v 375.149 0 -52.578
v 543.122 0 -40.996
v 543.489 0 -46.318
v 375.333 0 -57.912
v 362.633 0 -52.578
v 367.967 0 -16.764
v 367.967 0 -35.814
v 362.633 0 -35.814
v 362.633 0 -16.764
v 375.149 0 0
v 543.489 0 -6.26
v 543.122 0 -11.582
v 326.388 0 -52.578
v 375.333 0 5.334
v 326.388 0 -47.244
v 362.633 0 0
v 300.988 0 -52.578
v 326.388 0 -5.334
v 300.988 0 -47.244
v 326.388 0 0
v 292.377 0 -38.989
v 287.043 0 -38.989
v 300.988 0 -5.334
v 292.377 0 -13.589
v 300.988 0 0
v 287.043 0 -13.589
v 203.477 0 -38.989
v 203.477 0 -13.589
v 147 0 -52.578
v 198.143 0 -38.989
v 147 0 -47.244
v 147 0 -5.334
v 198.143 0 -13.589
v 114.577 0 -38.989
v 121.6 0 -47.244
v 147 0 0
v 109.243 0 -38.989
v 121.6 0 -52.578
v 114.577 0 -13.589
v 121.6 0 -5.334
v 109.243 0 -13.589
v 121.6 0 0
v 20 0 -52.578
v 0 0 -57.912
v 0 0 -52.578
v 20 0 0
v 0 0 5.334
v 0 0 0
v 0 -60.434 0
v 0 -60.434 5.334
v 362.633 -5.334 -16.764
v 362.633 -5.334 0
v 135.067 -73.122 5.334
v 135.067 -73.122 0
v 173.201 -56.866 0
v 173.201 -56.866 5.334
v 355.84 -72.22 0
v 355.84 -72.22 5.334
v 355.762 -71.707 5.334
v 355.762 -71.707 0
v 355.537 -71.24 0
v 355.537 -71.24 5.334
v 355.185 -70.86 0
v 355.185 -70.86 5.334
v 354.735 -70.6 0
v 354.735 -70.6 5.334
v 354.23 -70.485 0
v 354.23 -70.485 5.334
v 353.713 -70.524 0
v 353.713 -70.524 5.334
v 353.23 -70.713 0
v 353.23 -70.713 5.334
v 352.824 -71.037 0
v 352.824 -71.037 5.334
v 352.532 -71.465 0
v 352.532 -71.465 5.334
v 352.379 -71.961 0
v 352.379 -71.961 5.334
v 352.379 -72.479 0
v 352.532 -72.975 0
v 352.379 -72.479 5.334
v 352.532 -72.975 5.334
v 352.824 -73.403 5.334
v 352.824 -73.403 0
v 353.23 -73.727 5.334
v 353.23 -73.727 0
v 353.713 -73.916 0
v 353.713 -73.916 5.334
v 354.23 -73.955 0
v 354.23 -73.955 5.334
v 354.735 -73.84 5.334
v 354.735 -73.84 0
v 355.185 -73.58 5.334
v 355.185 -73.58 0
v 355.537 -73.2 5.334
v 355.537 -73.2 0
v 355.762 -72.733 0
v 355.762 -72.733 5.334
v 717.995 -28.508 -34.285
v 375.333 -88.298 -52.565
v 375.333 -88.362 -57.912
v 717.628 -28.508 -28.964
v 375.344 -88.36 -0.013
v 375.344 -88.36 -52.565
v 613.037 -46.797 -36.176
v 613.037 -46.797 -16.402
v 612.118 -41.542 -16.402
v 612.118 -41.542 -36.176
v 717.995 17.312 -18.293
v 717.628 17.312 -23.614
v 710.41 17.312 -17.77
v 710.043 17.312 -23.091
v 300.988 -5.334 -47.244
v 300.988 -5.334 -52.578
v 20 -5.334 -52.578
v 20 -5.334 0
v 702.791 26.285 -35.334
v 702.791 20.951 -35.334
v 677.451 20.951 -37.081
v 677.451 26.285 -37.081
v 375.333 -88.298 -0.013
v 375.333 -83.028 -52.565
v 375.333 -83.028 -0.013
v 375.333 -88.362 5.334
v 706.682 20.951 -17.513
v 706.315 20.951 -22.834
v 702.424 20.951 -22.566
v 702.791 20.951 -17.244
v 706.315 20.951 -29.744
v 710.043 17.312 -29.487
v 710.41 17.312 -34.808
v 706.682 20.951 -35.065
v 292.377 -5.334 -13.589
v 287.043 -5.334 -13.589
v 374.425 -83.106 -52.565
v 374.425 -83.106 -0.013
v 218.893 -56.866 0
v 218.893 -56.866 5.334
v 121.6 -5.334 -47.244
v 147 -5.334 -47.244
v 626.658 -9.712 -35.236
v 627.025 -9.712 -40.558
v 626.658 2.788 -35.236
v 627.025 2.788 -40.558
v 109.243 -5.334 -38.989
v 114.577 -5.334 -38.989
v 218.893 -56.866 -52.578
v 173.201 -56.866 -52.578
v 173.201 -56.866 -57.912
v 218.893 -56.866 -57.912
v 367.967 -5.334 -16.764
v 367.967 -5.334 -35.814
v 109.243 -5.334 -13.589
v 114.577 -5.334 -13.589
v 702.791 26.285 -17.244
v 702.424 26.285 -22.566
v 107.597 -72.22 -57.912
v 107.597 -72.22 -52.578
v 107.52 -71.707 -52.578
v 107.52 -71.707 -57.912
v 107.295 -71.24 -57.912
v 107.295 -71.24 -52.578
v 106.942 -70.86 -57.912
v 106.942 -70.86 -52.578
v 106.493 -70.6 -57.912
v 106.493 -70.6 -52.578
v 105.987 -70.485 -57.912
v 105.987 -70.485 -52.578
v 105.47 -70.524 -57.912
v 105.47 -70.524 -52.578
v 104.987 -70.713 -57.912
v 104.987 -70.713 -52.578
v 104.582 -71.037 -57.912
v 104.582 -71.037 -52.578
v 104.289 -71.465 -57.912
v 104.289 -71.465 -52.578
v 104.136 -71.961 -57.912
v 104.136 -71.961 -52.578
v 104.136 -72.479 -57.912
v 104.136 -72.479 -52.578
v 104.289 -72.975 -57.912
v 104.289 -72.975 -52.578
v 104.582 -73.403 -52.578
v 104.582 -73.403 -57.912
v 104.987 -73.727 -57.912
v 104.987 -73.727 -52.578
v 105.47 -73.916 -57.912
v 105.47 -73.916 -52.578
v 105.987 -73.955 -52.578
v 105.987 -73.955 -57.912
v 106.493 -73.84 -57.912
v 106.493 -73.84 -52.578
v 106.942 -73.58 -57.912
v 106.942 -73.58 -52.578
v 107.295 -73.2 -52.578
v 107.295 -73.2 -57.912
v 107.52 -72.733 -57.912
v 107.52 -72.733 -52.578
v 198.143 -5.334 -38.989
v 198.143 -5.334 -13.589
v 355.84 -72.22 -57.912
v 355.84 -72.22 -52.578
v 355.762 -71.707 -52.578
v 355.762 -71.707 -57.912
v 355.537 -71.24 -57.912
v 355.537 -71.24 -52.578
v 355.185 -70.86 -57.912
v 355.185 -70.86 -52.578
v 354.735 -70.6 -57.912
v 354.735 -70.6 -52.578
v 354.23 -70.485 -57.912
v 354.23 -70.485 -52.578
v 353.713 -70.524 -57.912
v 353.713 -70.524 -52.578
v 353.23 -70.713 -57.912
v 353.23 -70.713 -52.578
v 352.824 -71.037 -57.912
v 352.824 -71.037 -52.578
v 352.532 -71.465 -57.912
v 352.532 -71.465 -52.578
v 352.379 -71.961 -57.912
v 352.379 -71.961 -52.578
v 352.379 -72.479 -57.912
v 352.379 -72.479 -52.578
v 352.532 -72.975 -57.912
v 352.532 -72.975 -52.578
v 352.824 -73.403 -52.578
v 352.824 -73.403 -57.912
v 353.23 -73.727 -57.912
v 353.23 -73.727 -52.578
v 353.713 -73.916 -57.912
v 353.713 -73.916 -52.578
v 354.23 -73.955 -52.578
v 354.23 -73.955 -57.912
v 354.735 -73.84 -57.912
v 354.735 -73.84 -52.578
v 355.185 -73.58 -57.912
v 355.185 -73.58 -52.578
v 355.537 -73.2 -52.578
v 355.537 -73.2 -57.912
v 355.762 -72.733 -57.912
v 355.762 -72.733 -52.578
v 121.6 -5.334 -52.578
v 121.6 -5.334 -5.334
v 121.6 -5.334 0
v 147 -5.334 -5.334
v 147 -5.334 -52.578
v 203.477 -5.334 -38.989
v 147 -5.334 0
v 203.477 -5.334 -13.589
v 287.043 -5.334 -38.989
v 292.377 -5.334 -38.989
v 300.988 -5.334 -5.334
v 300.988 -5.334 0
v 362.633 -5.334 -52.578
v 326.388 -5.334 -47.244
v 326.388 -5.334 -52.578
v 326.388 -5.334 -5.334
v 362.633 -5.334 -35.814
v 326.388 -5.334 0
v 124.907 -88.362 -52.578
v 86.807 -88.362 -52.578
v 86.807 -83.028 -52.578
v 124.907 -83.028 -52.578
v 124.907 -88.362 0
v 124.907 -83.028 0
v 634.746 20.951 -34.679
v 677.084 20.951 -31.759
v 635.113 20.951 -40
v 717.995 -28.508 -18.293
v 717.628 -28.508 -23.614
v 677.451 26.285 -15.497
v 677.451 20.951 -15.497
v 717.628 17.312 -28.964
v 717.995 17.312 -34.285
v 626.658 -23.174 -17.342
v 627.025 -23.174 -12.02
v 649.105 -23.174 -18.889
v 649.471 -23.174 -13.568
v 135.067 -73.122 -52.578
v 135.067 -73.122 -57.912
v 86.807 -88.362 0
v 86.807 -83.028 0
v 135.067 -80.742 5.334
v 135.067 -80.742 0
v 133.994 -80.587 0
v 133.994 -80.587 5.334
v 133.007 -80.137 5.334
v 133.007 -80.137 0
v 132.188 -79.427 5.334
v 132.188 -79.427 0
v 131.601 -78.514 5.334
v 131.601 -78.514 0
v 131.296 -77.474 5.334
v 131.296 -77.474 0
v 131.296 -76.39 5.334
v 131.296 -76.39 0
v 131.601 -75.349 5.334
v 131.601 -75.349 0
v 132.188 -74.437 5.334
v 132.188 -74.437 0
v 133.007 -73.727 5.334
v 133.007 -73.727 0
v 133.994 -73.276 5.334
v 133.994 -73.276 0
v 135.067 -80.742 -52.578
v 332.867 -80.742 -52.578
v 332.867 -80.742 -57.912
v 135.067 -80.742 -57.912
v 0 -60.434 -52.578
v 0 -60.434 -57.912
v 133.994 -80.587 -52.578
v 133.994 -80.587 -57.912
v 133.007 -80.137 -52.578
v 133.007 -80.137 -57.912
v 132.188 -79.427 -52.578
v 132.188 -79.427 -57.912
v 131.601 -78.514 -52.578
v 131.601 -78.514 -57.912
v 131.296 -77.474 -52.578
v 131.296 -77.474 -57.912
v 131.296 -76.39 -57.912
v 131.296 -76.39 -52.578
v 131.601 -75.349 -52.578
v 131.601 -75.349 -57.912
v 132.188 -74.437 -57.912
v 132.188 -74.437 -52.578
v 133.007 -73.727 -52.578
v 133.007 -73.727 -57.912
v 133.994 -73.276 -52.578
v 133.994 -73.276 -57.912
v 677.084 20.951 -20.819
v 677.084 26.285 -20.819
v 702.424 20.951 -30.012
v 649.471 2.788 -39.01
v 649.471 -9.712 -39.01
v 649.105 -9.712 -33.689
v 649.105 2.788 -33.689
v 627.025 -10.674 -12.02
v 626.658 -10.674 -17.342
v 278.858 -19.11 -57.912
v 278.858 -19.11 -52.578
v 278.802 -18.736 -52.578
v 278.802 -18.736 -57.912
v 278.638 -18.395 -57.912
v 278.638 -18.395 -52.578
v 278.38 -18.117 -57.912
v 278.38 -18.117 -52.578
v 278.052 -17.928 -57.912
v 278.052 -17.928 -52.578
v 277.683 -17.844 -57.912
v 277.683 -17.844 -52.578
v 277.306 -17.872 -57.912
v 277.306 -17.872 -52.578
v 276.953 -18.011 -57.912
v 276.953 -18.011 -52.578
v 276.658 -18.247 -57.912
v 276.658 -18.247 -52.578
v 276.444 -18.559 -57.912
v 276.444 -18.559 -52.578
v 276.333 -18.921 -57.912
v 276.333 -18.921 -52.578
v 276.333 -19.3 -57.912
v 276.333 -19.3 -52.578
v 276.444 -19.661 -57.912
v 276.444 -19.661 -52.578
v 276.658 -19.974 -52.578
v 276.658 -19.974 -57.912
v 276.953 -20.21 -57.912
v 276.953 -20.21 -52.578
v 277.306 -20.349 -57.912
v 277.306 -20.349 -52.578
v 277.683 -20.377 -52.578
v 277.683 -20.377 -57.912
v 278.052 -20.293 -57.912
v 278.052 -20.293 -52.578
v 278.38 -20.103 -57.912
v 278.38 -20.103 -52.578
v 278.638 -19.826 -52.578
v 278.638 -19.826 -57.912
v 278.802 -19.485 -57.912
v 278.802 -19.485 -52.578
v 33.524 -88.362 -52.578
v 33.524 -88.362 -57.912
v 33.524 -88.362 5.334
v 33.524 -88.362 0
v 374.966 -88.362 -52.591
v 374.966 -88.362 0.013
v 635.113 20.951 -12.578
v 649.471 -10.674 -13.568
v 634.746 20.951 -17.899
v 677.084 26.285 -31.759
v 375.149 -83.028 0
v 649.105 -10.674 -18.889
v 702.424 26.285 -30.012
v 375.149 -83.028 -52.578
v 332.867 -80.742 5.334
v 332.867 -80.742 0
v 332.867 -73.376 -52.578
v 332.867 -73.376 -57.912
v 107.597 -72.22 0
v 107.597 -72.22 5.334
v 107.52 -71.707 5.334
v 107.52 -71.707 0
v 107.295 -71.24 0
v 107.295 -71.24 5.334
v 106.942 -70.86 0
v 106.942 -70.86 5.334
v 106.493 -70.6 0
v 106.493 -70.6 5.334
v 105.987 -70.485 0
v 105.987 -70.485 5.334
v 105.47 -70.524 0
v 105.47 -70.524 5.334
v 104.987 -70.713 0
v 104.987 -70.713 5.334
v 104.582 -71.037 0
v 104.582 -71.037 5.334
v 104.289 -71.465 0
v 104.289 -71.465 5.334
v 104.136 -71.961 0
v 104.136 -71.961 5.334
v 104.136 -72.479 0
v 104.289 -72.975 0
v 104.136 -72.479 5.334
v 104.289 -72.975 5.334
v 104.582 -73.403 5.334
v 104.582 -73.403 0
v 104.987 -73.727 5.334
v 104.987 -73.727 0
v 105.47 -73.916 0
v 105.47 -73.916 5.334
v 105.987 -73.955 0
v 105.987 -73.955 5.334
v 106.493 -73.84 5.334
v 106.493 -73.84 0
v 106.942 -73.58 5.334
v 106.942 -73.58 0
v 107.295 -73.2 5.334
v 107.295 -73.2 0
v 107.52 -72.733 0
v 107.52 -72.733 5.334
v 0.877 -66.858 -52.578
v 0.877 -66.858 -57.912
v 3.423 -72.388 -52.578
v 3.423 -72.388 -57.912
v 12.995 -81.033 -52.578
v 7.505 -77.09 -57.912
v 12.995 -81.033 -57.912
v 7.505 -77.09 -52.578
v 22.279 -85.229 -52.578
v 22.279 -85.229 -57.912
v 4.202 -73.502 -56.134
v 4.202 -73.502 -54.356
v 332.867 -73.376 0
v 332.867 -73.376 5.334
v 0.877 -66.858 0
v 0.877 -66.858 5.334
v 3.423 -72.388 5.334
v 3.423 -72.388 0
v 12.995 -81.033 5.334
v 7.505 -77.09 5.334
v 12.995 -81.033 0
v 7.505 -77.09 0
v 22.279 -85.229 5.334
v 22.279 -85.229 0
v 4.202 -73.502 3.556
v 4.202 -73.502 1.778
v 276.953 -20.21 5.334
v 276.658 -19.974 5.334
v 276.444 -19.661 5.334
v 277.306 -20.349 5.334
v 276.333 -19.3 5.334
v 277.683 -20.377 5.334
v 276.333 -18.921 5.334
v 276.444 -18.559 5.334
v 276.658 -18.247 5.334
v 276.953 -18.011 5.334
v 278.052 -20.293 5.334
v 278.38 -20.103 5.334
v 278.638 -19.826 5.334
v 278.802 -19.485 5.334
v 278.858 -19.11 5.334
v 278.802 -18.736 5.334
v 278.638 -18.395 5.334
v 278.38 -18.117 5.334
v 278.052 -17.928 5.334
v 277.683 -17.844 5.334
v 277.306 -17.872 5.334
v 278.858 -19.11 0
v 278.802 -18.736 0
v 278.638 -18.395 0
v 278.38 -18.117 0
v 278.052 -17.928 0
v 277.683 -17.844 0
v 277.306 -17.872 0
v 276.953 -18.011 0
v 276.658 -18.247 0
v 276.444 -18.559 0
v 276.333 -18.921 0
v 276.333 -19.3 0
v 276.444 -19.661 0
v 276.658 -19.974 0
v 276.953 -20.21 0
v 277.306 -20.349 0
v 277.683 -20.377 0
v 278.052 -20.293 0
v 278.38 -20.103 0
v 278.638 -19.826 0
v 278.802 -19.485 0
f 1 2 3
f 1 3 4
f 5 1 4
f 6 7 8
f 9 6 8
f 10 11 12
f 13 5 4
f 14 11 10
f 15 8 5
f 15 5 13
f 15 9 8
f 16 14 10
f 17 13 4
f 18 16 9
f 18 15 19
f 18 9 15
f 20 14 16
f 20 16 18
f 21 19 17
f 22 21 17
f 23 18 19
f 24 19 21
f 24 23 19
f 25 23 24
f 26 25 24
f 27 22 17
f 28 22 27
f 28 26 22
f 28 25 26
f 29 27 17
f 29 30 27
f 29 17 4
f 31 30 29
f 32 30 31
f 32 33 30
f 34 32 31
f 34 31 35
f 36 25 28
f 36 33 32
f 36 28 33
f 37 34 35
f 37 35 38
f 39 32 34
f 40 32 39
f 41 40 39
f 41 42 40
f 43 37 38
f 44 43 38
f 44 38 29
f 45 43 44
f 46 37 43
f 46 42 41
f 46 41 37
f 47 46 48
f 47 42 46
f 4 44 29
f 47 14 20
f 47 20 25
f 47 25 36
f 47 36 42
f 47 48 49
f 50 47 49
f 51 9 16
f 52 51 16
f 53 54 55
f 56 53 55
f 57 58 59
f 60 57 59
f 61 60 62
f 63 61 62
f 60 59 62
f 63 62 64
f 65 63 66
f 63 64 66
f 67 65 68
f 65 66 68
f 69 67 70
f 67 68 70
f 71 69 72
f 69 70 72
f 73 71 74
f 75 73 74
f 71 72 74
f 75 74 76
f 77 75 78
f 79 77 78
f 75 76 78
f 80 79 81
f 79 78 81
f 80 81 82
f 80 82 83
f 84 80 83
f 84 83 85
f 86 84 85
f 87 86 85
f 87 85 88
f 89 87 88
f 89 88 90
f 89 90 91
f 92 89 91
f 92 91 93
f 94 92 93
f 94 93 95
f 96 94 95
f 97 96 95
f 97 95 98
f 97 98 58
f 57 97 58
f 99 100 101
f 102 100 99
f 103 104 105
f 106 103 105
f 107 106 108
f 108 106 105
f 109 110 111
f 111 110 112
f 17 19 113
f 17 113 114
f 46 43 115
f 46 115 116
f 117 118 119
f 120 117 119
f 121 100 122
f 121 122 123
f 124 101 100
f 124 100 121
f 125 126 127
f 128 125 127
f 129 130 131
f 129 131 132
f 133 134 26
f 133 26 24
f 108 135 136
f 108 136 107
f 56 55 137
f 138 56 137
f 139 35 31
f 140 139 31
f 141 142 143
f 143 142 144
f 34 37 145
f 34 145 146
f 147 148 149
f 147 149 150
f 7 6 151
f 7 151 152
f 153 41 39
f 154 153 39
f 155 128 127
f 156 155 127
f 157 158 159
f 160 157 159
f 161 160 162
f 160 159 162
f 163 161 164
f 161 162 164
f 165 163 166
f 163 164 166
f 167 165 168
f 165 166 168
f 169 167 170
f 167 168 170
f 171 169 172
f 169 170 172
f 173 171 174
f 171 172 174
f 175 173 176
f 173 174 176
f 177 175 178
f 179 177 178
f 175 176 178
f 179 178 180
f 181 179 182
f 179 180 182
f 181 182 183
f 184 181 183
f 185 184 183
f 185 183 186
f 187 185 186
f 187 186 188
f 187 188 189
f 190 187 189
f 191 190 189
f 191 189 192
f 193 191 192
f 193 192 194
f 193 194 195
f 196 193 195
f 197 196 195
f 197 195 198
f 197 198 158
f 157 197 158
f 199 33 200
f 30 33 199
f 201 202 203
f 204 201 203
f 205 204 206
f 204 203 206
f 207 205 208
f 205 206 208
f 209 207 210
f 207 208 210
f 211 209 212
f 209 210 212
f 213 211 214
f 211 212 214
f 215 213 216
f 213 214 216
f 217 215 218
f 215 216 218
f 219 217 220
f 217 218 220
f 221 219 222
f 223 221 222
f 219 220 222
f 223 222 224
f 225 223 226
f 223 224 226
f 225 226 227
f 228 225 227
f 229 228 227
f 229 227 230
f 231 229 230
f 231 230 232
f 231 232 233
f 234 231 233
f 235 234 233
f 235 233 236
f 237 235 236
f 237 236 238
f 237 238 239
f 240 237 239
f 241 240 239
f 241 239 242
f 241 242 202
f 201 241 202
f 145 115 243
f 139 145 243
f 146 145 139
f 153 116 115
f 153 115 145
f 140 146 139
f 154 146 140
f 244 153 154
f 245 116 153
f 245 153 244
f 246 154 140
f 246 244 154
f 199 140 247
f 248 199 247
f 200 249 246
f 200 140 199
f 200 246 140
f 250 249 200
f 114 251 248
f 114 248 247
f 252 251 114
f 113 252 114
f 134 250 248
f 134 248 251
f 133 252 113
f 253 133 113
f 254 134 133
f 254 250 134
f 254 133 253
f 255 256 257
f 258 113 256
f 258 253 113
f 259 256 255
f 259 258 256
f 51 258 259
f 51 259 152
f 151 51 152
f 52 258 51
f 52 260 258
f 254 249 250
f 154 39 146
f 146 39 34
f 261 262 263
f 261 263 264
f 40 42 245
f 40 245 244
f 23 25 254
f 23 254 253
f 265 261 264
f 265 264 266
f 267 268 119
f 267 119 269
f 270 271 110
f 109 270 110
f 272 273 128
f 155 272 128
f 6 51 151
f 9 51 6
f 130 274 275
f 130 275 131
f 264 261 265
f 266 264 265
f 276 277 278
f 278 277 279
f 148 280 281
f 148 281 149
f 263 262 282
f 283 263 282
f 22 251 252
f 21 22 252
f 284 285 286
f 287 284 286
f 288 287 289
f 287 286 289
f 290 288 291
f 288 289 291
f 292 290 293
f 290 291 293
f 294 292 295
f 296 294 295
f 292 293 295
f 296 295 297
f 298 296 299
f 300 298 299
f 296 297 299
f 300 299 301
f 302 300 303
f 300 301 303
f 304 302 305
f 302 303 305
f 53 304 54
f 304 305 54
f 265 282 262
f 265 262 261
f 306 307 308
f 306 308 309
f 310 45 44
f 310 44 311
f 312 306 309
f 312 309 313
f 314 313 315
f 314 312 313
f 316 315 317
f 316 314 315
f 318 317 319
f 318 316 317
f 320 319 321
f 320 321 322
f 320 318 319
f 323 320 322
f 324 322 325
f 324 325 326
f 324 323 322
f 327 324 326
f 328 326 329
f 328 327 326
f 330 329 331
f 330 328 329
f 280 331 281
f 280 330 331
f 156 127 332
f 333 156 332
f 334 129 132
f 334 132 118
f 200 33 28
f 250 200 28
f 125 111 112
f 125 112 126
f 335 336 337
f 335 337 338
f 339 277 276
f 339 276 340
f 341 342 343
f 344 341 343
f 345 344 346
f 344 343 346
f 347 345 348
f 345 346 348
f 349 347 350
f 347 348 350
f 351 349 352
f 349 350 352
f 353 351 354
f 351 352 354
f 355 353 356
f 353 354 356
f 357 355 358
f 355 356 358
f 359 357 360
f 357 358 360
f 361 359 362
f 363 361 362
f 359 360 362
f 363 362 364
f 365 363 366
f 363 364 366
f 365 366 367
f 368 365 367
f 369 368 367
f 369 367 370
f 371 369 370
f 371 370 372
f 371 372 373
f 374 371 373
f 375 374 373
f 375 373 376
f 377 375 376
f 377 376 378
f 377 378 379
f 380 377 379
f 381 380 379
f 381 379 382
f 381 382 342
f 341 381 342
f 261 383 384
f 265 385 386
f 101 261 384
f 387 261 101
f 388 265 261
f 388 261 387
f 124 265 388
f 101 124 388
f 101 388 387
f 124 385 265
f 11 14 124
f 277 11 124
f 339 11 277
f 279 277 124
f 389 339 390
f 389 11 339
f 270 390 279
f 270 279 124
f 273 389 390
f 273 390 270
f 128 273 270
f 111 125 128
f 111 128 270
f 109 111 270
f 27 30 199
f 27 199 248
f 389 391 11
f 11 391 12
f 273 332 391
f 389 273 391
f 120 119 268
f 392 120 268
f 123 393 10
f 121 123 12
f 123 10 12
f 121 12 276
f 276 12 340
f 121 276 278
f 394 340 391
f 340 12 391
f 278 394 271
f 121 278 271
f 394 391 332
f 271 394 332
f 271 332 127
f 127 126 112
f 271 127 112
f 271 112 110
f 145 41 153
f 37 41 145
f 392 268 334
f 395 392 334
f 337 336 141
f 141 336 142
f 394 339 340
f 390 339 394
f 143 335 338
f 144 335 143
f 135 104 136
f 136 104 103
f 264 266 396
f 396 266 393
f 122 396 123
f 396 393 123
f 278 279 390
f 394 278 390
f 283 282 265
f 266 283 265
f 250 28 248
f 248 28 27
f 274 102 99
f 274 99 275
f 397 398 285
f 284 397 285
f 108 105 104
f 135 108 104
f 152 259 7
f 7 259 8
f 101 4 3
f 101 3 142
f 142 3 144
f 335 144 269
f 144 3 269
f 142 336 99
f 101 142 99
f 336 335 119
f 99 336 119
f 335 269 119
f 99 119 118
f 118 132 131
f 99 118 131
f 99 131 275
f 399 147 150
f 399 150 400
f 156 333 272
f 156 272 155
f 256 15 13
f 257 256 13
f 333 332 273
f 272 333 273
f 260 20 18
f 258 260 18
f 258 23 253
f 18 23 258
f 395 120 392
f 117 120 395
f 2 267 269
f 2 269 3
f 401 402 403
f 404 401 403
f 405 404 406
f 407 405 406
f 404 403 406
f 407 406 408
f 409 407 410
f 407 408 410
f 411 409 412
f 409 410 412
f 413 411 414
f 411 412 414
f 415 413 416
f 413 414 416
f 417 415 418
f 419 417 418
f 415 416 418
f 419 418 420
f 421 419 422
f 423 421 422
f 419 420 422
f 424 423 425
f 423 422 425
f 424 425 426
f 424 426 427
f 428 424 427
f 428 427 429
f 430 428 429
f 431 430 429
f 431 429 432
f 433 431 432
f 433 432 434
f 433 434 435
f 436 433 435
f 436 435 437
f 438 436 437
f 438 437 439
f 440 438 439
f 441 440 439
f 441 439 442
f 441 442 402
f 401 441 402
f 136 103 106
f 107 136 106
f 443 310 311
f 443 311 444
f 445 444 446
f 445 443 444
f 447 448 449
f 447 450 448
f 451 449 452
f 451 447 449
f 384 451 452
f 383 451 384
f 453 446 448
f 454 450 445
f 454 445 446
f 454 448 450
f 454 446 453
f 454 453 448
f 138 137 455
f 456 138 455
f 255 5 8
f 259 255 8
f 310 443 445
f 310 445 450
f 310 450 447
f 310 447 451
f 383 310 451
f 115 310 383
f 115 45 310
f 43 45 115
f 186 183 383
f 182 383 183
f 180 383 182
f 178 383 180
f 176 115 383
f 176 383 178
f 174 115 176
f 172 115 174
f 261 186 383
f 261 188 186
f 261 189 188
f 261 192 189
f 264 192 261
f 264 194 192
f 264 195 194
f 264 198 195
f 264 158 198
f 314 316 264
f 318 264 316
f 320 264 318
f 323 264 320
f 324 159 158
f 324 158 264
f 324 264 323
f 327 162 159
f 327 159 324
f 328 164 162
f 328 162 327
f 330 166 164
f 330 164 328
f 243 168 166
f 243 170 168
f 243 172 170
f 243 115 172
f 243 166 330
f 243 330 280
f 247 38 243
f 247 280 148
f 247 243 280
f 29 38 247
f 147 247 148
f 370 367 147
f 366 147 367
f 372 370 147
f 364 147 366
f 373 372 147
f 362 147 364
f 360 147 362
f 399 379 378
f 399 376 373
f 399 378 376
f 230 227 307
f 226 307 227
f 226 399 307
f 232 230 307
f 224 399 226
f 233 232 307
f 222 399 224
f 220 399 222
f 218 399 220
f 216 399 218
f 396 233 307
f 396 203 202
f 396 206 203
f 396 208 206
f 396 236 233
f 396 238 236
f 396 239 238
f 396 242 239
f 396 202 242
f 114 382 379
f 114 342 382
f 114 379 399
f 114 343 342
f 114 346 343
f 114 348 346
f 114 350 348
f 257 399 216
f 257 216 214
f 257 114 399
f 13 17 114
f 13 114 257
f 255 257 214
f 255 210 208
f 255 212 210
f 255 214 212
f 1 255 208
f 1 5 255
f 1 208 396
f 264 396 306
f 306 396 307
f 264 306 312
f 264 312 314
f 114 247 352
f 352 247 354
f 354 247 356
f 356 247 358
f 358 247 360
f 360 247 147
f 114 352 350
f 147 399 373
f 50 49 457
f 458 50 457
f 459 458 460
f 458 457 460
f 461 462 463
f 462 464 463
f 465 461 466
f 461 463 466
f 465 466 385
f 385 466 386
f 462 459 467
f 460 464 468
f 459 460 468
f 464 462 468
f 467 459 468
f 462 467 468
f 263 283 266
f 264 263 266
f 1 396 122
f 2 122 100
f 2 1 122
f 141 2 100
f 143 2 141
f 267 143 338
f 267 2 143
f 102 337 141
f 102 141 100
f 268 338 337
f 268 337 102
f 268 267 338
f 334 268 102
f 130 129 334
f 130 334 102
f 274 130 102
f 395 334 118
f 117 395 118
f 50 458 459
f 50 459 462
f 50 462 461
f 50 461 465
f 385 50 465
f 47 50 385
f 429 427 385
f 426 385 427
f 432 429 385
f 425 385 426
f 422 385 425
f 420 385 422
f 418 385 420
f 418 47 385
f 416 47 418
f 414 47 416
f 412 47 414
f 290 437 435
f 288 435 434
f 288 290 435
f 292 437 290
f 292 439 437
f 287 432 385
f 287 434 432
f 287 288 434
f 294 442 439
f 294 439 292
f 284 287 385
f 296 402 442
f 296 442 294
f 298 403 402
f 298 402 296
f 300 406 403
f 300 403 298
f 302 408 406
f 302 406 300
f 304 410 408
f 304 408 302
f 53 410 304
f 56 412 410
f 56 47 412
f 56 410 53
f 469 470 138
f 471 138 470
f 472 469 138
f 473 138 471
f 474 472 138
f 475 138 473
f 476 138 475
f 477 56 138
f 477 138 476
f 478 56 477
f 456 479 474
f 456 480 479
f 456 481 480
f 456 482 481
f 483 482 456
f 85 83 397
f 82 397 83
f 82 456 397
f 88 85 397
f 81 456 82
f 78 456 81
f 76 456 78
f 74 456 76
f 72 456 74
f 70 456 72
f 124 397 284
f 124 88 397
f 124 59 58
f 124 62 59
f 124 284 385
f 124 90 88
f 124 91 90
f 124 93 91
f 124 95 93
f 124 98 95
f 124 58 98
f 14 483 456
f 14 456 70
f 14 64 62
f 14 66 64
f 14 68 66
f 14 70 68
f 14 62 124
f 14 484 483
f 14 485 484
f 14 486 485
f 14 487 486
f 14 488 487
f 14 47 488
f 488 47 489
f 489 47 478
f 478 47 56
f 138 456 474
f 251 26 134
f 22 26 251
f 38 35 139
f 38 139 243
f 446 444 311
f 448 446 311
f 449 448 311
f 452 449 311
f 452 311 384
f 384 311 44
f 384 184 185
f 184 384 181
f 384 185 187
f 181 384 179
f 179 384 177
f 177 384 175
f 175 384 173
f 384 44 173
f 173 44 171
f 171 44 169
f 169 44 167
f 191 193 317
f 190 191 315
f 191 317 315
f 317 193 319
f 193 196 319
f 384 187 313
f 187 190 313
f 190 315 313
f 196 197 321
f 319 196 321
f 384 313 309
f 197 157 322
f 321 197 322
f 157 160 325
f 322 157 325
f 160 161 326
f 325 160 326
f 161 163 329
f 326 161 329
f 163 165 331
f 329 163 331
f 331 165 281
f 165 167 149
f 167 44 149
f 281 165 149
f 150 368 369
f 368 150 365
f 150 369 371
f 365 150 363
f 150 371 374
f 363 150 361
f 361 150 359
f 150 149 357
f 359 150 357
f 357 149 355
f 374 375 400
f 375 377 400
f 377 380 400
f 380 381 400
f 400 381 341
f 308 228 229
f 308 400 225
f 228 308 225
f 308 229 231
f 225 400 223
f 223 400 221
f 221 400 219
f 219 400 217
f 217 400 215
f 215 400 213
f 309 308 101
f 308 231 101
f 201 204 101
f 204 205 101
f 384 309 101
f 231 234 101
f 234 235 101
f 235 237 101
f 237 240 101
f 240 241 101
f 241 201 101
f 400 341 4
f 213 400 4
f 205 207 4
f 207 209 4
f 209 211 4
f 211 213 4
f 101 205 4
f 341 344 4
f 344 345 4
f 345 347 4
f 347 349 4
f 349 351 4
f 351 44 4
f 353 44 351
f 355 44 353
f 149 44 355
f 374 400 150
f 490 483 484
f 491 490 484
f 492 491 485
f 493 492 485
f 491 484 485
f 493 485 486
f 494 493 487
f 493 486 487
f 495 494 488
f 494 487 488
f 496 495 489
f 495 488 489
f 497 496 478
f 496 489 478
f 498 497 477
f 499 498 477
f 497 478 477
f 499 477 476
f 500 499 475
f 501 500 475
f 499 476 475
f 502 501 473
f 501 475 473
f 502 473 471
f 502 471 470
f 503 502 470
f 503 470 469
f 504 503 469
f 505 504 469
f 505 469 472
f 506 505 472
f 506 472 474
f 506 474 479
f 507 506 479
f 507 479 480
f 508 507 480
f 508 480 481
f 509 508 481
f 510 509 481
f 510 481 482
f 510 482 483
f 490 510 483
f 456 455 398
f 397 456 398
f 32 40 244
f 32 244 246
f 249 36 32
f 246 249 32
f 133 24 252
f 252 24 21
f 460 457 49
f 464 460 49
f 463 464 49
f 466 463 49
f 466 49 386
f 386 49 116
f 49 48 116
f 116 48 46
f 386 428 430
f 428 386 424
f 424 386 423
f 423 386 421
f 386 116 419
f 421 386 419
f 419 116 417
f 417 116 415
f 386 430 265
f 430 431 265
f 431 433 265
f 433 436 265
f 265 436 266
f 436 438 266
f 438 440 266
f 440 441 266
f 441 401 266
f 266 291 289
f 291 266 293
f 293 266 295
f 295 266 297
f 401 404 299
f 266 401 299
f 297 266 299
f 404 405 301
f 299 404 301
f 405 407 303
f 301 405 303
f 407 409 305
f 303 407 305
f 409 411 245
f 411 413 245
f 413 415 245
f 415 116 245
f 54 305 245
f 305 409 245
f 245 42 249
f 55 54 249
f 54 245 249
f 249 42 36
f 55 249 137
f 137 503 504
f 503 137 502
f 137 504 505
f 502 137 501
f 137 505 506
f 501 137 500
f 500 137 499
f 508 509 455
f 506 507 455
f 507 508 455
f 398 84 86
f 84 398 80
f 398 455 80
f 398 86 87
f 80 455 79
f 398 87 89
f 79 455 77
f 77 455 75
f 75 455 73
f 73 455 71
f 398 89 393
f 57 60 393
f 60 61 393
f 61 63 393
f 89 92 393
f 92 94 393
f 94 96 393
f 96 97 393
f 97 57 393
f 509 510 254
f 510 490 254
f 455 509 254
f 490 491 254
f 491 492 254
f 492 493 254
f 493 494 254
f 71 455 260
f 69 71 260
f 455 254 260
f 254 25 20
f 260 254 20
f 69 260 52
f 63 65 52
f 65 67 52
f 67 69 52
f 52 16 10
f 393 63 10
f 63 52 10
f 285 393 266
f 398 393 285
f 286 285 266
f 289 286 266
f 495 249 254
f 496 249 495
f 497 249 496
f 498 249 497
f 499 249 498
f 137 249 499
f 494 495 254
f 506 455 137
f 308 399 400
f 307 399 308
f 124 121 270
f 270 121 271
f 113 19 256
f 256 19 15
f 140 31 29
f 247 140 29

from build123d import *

# Parameters (mm, degrees)
BOSS_EXTRUDE1_DEPTH                    = 5.334
SKETCH3_W                              = 342.632808843
SKETCH3_H                              = 26.289
BOSS_EXTRUDE2_DEPTH                    = 5.334
BOSS_EXTRUDE5_START                    = -5.334
BOSS_EXTRUDE5_DEPTH                    = 5.334
POWER_POD_SLOTS_REACH                  = 727.726
SKETCH13_W                             = 25.4
SKETCH13_H                             = 5.334
ELEVATOR_TABS_DEPTH                    = 5.334
SKETCH19_W                             = 19.05
SKETCH19_H                             = 5.334
FORMER_TAB_DEPTH                       = 5.334
RUDDER_SERVO_SLOT_REACH                = 728.753
SKETCH16_W                             = 22.5
SKETCH16_H                             = 12.5
ELEVATOR_SERVO_SLOT_REACH              = 725.169
SKETCH17_W                             = 22.5
SKETCH17_H                             = 12.5
FORMER_SLOTS_REACH                     = 727.726
SKETCH26_W                             = 5.334
SKETCH26_H                             = 25.4
SKETCH21_W                             = 250.425843048
SKETCH21_H                             = 52.578
UNDERBELLY_DEPTH                       = 5.334
SKETCH21_6_W                           = 38.1
SKETCH21_6_H                           = 52.578
REMOVABLE_WING_SUPPORT_DEPTH           = 5.334
ANGLED_UNDERBELLY_DEPTH                = 5.334
SKETCH28_R                             = 1.7399
F_15_CRUSH_REMOVABLE_WING_MOUNTS_DEPTH = 727.171052045
SKETCH30_R                             = 1.27
BBQ_SKEWER_HOLES_DEPTH                 = 727.171052045


# Read off the part's stored shape, not the designer's step: Boss-Extrude5
with BuildPart() as part:
    # Sketch2 → Boss-Extrude1 (new body)
    with BuildSketch(Plane.XY):
        with BuildLine():
            Line((375.332808843, 0), (0, 0))
            Line((0, 0), (0, -60.43360552))
            add(Edge.make_bspline(
                [(0, -60.43360552), (0, -75.756990751), (13.319871138, -83.937776911), (33.52399345, -88.361758411)],
                knots=[0, 0, 0, 0, 0.085212973, 0.085212973, 0.085212973, 0.085212973], degree=3))
            Line((33.52399345, -88.361758411), (375.332808843, -88.361758411))
            Line((375.332808843, -88.361758411), (375.332808843, 0))
        make_face()
        with BuildLine():
            Line((173.201240555, -80.741758411), (135.066965795, -80.741758411))
            ThreePointArc((135.066965795, -80.741758411), (131.256965795, -76.931758411), (135.066965795, -73.121758411))
            Line((135.066965795, -73.121758411), (173.201240555, -56.865758411))
            Line((173.201240555, -56.865758411), (218.892549783, -56.865758411))
            Line((218.892549783, -56.865758411), (332.866595595, -73.375758411))
            Line((332.866595595, -73.375758411), (332.866595595, -80.741758411))
            Line((332.866595595, -80.741758411), (218.892549783, -80.741758411))
            Line((218.892549783, -80.741758411), (173.201240555, -80.741758411))
        make_face(mode=Mode.SUBTRACT)
    boss_extrude1 = extrude(amount=BOSS_EXTRUDE1_DEPTH)

    # Sketch3 → Boss-Extrude2 (add)
    with BuildSketch(Plane(origin=(0, 0, 0), x_dir=(1, 0, 0), z_dir=(0, 1, 0))):
        with Locations((191.316404422, 13.1445)):
            Rectangle(SKETCH3_W, SKETCH3_H)
    boss_extrude2 = extrude(amount=-BOSS_EXTRUDE2_DEPTH)

    # Boss-Extrude5 outline → Boss-Extrude5 (add)
    with BuildSketch(Plane(origin=(2.141983772, 0, 31.065619336), x_dir=(0.9976313703333219, 0, -0.0687869822485207), z_dir=(0.0687869822485207, 0, 0.9976313703333219)).offset(BOSS_EXTRUDE5_START)):
        Polygon((717.552437166, -28.507984923), (717.552437166, 17.312222731), (709.949782932, 17.312222731), (706.212906654, 20.95112249), (634.474168953, 20.95112249), (542.63206433, 0), (374.076874654, 0), (374.076874654, -88.361758411), align=None)
    boss_extrude5 = extrude(amount=BOSS_EXTRUDE5_DEPTH)

    # Mirror4: Boss-Extrude1, Boss-Extrude2, Boss-Extrude5 across plane
    add(boss_extrude1.mirror(Plane(origin=(20, -5.334, -26.289), x_dir=(1, 0, 0), z_dir=(0, 0, -1))))
    add(boss_extrude2.mirror(Plane(origin=(20, -5.334, -26.289), x_dir=(1, 0, 0), z_dir=(0, 0, -1))))
    add(boss_extrude5.mirror(Plane(origin=(20, -5.334, -26.289), x_dir=(1, 0, 0), z_dir=(0, 0, -1))))

    # Sketch13 → Power Pod Slots (cut, up to next)
    with BuildSketch(Plane(origin=(0, 0, 0), x_dir=(1, 0, 0), z_dir=(0, 1, 0)), mode=Mode.PRIVATE) as power_pod_slots_sk1:
        with Locations((313.6875, 49.911)):
            Rectangle(SKETCH13_W, SKETCH13_H)
    power_pod_slots_tool1 = extrude(power_pod_slots_sk1.sketch, amount=-POWER_POD_SLOTS_REACH, mode=Mode.PRIVATE) & part.part
    # Sketch13 → Power Pod Slots (cut, up to next)
    with BuildSketch(Plane(origin=(0, 0, 0), x_dir=(1, 0, 0), z_dir=(0, 1, 0)), mode=Mode.PRIVATE) as power_pod_slots_sk2:
        with Locations((313.6875, 2.667)):
            Rectangle(SKETCH13_W, SKETCH13_H)
    power_pod_slots_tool2 = extrude(power_pod_slots_sk2.sketch, amount=-POWER_POD_SLOTS_REACH, mode=Mode.PRIVATE) & part.part
    # Sketch13 → Power Pod Slots (cut, up to next)
    with BuildSketch(Plane(origin=(0, 0, 0), x_dir=(1, 0, 0), z_dir=(0, 1, 0)), mode=Mode.PRIVATE) as power_pod_slots_sk3:
        with Locations((134.3, 2.667)):
            Rectangle(SKETCH13_W, SKETCH13_H)
    power_pod_slots_tool3 = extrude(power_pod_slots_sk3.sketch, amount=-POWER_POD_SLOTS_REACH, mode=Mode.PRIVATE) & part.part
    # Sketch13 → Power Pod Slots (cut, up to next)
    with BuildSketch(Plane(origin=(0, 0, 0), x_dir=(1, 0, 0), z_dir=(0, 1, 0)), mode=Mode.PRIVATE) as power_pod_slots_sk4:
        with Locations((134.3, 49.911)):
            Rectangle(SKETCH13_W, SKETCH13_H)
    power_pod_slots_tool4 = extrude(power_pod_slots_sk4.sketch, amount=-POWER_POD_SLOTS_REACH, mode=Mode.PRIVATE) & part.part
    add(power_pod_slots_tool1.solids().sort_by_distance((313.6875, 0, -49.911))[0], mode=Mode.SUBTRACT)
    add(power_pod_slots_tool2.solids().sort_by_distance((313.6875, 0, -2.667))[0], mode=Mode.SUBTRACT)
    add(power_pod_slots_tool3.solids().sort_by_distance((134.3, 0, -2.667))[0], mode=Mode.SUBTRACT)
    add(power_pod_slots_tool4.solids().sort_by_distance((134.3, 0, -49.911))[0], mode=Mode.SUBTRACT)

    # Sketch14 → Elevator Tabs (add)
    with BuildSketch(Plane(origin=(0, 20.95112249, 0), x_dir=(1, 0, 0), z_dir=(0, 1, 0))):
        Polygon((702.790902865, 35.333666188), (677.451066058, 37.080855537), (677.084156295, 31.759489808), (702.423993101, 30.012300459), align=None)
        Polygon((702.790902865, 17.244333812), (702.423993101, 22.565699541), (677.084156295, 20.818510192), (677.451066058, 15.497144463), align=None)
    extrude(amount=ELEVATOR_TABS_DEPTH)

    # Sketch19 → Former Tab (add)
    with BuildSketch(Plane(origin=(362.632808843, 0, 0), x_dir=(0, 0, -1), z_dir=(1, 0, 0))):
        with Locations((26.289, -2.667)):
            Rectangle(SKETCH19_W, SKETCH19_H)
    extrude(amount=FORMER_TAB_DEPTH)

    # Sketch16 → Rudder Servo Slot (cut, up to next)
    with BuildSketch(Plane(origin=(2.141983772, 0, 31.065619336), x_dir=(0.9976313703333219, 0, -0.06878698224852071), z_dir=(0.06878698224852071, 0, 0.997631370333322)), mode=Mode.PRIVATE) as rudder_servo_slot_sk1:
        with Locations((637.616437166, -16.923984923)):
            Rectangle(SKETCH16_W, SKETCH16_H)
    rudder_servo_slot_tool1 = extrude(rudder_servo_slot_sk1.sketch, amount=-RUDDER_SERVO_SLOT_REACH, mode=Mode.PRIVATE) & part.part
    add(rudder_servo_slot_tool1.solids().sort_by_distance((638.248144, -16.923985, -12.794091))[0], mode=Mode.SUBTRACT)

    # Sketch17 → Elevator Servo Slot (cut, up to next)
    with BuildSketch(Plane(origin=(5.750099145, 0, -83.394838699), x_dir=(-0.9976313703333219, 0, -0.06878698224852071), z_dir=(0.06878698224852071, 0, -0.997631370333322)), mode=Mode.PRIVATE) as elevator_servo_slot_sk1:
        with Locations((-633.999755214, -3.461984923)):
            Rectangle(SKETCH17_W, SKETCH17_H)
    elevator_servo_slot_tool1 = extrude(elevator_servo_slot_sk1.sketch, amount=-ELEVATOR_SERVO_SLOT_REACH, mode=Mode.PRIVATE) & part.part
    add(elevator_servo_slot_tool1.solids().sort_by_distance((638.248144, -3.461985, -39.783909))[0], mode=Mode.SUBTRACT)

    # Sketch26 → Former Slots (cut, up to next)
    with BuildSketch(Plane(origin=(0, 0, 0), x_dir=(1, 0, 0), z_dir=(0, 1, 0)), mode=Mode.PRIVATE) as former_slots_sk1:
        with Locations((200.810432831, 26.289)):
            Rectangle(SKETCH26_W, SKETCH26_H)
    former_slots_tool1 = extrude(former_slots_sk1.sketch, amount=-FORMER_SLOTS_REACH, mode=Mode.PRIVATE) & part.part
    # Sketch26 → Former Slots (cut, up to next)
    with BuildSketch(Plane(origin=(0, 0, 0), x_dir=(1, 0, 0), z_dir=(0, 1, 0)), mode=Mode.PRIVATE) as former_slots_sk2:
        with Locations((111.910432831, 26.289)):
            Rectangle(SKETCH26_W, SKETCH26_H)
    former_slots_tool2 = extrude(former_slots_sk2.sketch, amount=-FORMER_SLOTS_REACH, mode=Mode.PRIVATE) & part.part
    # Sketch26 → Former Slots (cut, up to next)
    with BuildSketch(Plane(origin=(0, 0, 0), x_dir=(1, 0, 0), z_dir=(0, 1, 0)), mode=Mode.PRIVATE) as former_slots_sk3:
        with Locations((289.710432831, 26.289)):
            Rectangle(SKETCH26_W, SKETCH26_H)
    former_slots_tool3 = extrude(former_slots_sk3.sketch, amount=-FORMER_SLOTS_REACH, mode=Mode.PRIVATE) & part.part
    add(former_slots_tool1.solids().sort_by_distance((200.810433, 0, -26.289))[0], mode=Mode.SUBTRACT)
    add(former_slots_tool2.solids().sort_by_distance((111.910433, 0, -26.289))[0], mode=Mode.SUBTRACT)
    add(former_slots_tool3.solids().sort_by_distance((289.710433, 0, -26.289))[0], mode=Mode.SUBTRACT)

    # Sketch21 → Underbelly (add)
    with BuildSketch(Plane.XZ.offset(88.361758411)):
        with Locations((250.119887319, -26.289)):
            Rectangle(SKETCH21_W, SKETCH21_H)
    extrude(amount=-UNDERBELLY_DEPTH)

    # Sketch28 → 15% Crush Removable Wing Mounts (cut, through all)
    with BuildSketch(Plane.XY.offset(5.334)):
        with Locations((354.099702219, -72.220058411)):
            Circle(SKETCH28_R)
        with Locations((105.856965795, -72.220058411)):
            Circle(SKETCH28_R)
    extrude(amount=-F_15_CRUSH_REMOVABLE_WING_MOUNTS_DEPTH, mode=Mode.SUBTRACT)

    # Sketch30 → BBQ Skewer Holes (cut, through all)
    with BuildSketch(Plane.XY.offset(5.334)):
        with Locations((277.588484301, -19.110387516)):
            Circle(SKETCH30_R)
    extrude(amount=-BBQ_SKEWER_HOLES_DEPTH, mode=Mode.SUBTRACT)


with BuildPart() as body_2:
    # Sketch21<6> → Removable Wing Support (new body)
    with BuildSketch(Plane.XZ.offset(88.361758411)):
        with Locations((105.856965795, -26.289)):
            Rectangle(SKETCH21_6_W, SKETCH21_6_H)
    extrude(amount=-REMOVABLE_WING_SUPPORT_DEPTH)


with BuildPart() as body_3:
    # Sketch25 → Angled Underbelly (new body)
    with BuildSketch(Plane(origin=(26.128255959, -149.423722322, 0), x_dir=(-0.985053848047073, -0.17224667325569476, 0), z_dir=(0.17224667325569476, -0.985053848047073, 0))):
        Polygon((-354.514047872, 52.565335732), (-354.514047872, 0.012664268), (-595.814047872, 16.402222618), (-595.814047872, 36.175777382), align=None)
    extrude(amount=-ANGLED_UNDERBELLY_DEPTH)


solid = Compound([part.part, body_2.part, body_3.part])
